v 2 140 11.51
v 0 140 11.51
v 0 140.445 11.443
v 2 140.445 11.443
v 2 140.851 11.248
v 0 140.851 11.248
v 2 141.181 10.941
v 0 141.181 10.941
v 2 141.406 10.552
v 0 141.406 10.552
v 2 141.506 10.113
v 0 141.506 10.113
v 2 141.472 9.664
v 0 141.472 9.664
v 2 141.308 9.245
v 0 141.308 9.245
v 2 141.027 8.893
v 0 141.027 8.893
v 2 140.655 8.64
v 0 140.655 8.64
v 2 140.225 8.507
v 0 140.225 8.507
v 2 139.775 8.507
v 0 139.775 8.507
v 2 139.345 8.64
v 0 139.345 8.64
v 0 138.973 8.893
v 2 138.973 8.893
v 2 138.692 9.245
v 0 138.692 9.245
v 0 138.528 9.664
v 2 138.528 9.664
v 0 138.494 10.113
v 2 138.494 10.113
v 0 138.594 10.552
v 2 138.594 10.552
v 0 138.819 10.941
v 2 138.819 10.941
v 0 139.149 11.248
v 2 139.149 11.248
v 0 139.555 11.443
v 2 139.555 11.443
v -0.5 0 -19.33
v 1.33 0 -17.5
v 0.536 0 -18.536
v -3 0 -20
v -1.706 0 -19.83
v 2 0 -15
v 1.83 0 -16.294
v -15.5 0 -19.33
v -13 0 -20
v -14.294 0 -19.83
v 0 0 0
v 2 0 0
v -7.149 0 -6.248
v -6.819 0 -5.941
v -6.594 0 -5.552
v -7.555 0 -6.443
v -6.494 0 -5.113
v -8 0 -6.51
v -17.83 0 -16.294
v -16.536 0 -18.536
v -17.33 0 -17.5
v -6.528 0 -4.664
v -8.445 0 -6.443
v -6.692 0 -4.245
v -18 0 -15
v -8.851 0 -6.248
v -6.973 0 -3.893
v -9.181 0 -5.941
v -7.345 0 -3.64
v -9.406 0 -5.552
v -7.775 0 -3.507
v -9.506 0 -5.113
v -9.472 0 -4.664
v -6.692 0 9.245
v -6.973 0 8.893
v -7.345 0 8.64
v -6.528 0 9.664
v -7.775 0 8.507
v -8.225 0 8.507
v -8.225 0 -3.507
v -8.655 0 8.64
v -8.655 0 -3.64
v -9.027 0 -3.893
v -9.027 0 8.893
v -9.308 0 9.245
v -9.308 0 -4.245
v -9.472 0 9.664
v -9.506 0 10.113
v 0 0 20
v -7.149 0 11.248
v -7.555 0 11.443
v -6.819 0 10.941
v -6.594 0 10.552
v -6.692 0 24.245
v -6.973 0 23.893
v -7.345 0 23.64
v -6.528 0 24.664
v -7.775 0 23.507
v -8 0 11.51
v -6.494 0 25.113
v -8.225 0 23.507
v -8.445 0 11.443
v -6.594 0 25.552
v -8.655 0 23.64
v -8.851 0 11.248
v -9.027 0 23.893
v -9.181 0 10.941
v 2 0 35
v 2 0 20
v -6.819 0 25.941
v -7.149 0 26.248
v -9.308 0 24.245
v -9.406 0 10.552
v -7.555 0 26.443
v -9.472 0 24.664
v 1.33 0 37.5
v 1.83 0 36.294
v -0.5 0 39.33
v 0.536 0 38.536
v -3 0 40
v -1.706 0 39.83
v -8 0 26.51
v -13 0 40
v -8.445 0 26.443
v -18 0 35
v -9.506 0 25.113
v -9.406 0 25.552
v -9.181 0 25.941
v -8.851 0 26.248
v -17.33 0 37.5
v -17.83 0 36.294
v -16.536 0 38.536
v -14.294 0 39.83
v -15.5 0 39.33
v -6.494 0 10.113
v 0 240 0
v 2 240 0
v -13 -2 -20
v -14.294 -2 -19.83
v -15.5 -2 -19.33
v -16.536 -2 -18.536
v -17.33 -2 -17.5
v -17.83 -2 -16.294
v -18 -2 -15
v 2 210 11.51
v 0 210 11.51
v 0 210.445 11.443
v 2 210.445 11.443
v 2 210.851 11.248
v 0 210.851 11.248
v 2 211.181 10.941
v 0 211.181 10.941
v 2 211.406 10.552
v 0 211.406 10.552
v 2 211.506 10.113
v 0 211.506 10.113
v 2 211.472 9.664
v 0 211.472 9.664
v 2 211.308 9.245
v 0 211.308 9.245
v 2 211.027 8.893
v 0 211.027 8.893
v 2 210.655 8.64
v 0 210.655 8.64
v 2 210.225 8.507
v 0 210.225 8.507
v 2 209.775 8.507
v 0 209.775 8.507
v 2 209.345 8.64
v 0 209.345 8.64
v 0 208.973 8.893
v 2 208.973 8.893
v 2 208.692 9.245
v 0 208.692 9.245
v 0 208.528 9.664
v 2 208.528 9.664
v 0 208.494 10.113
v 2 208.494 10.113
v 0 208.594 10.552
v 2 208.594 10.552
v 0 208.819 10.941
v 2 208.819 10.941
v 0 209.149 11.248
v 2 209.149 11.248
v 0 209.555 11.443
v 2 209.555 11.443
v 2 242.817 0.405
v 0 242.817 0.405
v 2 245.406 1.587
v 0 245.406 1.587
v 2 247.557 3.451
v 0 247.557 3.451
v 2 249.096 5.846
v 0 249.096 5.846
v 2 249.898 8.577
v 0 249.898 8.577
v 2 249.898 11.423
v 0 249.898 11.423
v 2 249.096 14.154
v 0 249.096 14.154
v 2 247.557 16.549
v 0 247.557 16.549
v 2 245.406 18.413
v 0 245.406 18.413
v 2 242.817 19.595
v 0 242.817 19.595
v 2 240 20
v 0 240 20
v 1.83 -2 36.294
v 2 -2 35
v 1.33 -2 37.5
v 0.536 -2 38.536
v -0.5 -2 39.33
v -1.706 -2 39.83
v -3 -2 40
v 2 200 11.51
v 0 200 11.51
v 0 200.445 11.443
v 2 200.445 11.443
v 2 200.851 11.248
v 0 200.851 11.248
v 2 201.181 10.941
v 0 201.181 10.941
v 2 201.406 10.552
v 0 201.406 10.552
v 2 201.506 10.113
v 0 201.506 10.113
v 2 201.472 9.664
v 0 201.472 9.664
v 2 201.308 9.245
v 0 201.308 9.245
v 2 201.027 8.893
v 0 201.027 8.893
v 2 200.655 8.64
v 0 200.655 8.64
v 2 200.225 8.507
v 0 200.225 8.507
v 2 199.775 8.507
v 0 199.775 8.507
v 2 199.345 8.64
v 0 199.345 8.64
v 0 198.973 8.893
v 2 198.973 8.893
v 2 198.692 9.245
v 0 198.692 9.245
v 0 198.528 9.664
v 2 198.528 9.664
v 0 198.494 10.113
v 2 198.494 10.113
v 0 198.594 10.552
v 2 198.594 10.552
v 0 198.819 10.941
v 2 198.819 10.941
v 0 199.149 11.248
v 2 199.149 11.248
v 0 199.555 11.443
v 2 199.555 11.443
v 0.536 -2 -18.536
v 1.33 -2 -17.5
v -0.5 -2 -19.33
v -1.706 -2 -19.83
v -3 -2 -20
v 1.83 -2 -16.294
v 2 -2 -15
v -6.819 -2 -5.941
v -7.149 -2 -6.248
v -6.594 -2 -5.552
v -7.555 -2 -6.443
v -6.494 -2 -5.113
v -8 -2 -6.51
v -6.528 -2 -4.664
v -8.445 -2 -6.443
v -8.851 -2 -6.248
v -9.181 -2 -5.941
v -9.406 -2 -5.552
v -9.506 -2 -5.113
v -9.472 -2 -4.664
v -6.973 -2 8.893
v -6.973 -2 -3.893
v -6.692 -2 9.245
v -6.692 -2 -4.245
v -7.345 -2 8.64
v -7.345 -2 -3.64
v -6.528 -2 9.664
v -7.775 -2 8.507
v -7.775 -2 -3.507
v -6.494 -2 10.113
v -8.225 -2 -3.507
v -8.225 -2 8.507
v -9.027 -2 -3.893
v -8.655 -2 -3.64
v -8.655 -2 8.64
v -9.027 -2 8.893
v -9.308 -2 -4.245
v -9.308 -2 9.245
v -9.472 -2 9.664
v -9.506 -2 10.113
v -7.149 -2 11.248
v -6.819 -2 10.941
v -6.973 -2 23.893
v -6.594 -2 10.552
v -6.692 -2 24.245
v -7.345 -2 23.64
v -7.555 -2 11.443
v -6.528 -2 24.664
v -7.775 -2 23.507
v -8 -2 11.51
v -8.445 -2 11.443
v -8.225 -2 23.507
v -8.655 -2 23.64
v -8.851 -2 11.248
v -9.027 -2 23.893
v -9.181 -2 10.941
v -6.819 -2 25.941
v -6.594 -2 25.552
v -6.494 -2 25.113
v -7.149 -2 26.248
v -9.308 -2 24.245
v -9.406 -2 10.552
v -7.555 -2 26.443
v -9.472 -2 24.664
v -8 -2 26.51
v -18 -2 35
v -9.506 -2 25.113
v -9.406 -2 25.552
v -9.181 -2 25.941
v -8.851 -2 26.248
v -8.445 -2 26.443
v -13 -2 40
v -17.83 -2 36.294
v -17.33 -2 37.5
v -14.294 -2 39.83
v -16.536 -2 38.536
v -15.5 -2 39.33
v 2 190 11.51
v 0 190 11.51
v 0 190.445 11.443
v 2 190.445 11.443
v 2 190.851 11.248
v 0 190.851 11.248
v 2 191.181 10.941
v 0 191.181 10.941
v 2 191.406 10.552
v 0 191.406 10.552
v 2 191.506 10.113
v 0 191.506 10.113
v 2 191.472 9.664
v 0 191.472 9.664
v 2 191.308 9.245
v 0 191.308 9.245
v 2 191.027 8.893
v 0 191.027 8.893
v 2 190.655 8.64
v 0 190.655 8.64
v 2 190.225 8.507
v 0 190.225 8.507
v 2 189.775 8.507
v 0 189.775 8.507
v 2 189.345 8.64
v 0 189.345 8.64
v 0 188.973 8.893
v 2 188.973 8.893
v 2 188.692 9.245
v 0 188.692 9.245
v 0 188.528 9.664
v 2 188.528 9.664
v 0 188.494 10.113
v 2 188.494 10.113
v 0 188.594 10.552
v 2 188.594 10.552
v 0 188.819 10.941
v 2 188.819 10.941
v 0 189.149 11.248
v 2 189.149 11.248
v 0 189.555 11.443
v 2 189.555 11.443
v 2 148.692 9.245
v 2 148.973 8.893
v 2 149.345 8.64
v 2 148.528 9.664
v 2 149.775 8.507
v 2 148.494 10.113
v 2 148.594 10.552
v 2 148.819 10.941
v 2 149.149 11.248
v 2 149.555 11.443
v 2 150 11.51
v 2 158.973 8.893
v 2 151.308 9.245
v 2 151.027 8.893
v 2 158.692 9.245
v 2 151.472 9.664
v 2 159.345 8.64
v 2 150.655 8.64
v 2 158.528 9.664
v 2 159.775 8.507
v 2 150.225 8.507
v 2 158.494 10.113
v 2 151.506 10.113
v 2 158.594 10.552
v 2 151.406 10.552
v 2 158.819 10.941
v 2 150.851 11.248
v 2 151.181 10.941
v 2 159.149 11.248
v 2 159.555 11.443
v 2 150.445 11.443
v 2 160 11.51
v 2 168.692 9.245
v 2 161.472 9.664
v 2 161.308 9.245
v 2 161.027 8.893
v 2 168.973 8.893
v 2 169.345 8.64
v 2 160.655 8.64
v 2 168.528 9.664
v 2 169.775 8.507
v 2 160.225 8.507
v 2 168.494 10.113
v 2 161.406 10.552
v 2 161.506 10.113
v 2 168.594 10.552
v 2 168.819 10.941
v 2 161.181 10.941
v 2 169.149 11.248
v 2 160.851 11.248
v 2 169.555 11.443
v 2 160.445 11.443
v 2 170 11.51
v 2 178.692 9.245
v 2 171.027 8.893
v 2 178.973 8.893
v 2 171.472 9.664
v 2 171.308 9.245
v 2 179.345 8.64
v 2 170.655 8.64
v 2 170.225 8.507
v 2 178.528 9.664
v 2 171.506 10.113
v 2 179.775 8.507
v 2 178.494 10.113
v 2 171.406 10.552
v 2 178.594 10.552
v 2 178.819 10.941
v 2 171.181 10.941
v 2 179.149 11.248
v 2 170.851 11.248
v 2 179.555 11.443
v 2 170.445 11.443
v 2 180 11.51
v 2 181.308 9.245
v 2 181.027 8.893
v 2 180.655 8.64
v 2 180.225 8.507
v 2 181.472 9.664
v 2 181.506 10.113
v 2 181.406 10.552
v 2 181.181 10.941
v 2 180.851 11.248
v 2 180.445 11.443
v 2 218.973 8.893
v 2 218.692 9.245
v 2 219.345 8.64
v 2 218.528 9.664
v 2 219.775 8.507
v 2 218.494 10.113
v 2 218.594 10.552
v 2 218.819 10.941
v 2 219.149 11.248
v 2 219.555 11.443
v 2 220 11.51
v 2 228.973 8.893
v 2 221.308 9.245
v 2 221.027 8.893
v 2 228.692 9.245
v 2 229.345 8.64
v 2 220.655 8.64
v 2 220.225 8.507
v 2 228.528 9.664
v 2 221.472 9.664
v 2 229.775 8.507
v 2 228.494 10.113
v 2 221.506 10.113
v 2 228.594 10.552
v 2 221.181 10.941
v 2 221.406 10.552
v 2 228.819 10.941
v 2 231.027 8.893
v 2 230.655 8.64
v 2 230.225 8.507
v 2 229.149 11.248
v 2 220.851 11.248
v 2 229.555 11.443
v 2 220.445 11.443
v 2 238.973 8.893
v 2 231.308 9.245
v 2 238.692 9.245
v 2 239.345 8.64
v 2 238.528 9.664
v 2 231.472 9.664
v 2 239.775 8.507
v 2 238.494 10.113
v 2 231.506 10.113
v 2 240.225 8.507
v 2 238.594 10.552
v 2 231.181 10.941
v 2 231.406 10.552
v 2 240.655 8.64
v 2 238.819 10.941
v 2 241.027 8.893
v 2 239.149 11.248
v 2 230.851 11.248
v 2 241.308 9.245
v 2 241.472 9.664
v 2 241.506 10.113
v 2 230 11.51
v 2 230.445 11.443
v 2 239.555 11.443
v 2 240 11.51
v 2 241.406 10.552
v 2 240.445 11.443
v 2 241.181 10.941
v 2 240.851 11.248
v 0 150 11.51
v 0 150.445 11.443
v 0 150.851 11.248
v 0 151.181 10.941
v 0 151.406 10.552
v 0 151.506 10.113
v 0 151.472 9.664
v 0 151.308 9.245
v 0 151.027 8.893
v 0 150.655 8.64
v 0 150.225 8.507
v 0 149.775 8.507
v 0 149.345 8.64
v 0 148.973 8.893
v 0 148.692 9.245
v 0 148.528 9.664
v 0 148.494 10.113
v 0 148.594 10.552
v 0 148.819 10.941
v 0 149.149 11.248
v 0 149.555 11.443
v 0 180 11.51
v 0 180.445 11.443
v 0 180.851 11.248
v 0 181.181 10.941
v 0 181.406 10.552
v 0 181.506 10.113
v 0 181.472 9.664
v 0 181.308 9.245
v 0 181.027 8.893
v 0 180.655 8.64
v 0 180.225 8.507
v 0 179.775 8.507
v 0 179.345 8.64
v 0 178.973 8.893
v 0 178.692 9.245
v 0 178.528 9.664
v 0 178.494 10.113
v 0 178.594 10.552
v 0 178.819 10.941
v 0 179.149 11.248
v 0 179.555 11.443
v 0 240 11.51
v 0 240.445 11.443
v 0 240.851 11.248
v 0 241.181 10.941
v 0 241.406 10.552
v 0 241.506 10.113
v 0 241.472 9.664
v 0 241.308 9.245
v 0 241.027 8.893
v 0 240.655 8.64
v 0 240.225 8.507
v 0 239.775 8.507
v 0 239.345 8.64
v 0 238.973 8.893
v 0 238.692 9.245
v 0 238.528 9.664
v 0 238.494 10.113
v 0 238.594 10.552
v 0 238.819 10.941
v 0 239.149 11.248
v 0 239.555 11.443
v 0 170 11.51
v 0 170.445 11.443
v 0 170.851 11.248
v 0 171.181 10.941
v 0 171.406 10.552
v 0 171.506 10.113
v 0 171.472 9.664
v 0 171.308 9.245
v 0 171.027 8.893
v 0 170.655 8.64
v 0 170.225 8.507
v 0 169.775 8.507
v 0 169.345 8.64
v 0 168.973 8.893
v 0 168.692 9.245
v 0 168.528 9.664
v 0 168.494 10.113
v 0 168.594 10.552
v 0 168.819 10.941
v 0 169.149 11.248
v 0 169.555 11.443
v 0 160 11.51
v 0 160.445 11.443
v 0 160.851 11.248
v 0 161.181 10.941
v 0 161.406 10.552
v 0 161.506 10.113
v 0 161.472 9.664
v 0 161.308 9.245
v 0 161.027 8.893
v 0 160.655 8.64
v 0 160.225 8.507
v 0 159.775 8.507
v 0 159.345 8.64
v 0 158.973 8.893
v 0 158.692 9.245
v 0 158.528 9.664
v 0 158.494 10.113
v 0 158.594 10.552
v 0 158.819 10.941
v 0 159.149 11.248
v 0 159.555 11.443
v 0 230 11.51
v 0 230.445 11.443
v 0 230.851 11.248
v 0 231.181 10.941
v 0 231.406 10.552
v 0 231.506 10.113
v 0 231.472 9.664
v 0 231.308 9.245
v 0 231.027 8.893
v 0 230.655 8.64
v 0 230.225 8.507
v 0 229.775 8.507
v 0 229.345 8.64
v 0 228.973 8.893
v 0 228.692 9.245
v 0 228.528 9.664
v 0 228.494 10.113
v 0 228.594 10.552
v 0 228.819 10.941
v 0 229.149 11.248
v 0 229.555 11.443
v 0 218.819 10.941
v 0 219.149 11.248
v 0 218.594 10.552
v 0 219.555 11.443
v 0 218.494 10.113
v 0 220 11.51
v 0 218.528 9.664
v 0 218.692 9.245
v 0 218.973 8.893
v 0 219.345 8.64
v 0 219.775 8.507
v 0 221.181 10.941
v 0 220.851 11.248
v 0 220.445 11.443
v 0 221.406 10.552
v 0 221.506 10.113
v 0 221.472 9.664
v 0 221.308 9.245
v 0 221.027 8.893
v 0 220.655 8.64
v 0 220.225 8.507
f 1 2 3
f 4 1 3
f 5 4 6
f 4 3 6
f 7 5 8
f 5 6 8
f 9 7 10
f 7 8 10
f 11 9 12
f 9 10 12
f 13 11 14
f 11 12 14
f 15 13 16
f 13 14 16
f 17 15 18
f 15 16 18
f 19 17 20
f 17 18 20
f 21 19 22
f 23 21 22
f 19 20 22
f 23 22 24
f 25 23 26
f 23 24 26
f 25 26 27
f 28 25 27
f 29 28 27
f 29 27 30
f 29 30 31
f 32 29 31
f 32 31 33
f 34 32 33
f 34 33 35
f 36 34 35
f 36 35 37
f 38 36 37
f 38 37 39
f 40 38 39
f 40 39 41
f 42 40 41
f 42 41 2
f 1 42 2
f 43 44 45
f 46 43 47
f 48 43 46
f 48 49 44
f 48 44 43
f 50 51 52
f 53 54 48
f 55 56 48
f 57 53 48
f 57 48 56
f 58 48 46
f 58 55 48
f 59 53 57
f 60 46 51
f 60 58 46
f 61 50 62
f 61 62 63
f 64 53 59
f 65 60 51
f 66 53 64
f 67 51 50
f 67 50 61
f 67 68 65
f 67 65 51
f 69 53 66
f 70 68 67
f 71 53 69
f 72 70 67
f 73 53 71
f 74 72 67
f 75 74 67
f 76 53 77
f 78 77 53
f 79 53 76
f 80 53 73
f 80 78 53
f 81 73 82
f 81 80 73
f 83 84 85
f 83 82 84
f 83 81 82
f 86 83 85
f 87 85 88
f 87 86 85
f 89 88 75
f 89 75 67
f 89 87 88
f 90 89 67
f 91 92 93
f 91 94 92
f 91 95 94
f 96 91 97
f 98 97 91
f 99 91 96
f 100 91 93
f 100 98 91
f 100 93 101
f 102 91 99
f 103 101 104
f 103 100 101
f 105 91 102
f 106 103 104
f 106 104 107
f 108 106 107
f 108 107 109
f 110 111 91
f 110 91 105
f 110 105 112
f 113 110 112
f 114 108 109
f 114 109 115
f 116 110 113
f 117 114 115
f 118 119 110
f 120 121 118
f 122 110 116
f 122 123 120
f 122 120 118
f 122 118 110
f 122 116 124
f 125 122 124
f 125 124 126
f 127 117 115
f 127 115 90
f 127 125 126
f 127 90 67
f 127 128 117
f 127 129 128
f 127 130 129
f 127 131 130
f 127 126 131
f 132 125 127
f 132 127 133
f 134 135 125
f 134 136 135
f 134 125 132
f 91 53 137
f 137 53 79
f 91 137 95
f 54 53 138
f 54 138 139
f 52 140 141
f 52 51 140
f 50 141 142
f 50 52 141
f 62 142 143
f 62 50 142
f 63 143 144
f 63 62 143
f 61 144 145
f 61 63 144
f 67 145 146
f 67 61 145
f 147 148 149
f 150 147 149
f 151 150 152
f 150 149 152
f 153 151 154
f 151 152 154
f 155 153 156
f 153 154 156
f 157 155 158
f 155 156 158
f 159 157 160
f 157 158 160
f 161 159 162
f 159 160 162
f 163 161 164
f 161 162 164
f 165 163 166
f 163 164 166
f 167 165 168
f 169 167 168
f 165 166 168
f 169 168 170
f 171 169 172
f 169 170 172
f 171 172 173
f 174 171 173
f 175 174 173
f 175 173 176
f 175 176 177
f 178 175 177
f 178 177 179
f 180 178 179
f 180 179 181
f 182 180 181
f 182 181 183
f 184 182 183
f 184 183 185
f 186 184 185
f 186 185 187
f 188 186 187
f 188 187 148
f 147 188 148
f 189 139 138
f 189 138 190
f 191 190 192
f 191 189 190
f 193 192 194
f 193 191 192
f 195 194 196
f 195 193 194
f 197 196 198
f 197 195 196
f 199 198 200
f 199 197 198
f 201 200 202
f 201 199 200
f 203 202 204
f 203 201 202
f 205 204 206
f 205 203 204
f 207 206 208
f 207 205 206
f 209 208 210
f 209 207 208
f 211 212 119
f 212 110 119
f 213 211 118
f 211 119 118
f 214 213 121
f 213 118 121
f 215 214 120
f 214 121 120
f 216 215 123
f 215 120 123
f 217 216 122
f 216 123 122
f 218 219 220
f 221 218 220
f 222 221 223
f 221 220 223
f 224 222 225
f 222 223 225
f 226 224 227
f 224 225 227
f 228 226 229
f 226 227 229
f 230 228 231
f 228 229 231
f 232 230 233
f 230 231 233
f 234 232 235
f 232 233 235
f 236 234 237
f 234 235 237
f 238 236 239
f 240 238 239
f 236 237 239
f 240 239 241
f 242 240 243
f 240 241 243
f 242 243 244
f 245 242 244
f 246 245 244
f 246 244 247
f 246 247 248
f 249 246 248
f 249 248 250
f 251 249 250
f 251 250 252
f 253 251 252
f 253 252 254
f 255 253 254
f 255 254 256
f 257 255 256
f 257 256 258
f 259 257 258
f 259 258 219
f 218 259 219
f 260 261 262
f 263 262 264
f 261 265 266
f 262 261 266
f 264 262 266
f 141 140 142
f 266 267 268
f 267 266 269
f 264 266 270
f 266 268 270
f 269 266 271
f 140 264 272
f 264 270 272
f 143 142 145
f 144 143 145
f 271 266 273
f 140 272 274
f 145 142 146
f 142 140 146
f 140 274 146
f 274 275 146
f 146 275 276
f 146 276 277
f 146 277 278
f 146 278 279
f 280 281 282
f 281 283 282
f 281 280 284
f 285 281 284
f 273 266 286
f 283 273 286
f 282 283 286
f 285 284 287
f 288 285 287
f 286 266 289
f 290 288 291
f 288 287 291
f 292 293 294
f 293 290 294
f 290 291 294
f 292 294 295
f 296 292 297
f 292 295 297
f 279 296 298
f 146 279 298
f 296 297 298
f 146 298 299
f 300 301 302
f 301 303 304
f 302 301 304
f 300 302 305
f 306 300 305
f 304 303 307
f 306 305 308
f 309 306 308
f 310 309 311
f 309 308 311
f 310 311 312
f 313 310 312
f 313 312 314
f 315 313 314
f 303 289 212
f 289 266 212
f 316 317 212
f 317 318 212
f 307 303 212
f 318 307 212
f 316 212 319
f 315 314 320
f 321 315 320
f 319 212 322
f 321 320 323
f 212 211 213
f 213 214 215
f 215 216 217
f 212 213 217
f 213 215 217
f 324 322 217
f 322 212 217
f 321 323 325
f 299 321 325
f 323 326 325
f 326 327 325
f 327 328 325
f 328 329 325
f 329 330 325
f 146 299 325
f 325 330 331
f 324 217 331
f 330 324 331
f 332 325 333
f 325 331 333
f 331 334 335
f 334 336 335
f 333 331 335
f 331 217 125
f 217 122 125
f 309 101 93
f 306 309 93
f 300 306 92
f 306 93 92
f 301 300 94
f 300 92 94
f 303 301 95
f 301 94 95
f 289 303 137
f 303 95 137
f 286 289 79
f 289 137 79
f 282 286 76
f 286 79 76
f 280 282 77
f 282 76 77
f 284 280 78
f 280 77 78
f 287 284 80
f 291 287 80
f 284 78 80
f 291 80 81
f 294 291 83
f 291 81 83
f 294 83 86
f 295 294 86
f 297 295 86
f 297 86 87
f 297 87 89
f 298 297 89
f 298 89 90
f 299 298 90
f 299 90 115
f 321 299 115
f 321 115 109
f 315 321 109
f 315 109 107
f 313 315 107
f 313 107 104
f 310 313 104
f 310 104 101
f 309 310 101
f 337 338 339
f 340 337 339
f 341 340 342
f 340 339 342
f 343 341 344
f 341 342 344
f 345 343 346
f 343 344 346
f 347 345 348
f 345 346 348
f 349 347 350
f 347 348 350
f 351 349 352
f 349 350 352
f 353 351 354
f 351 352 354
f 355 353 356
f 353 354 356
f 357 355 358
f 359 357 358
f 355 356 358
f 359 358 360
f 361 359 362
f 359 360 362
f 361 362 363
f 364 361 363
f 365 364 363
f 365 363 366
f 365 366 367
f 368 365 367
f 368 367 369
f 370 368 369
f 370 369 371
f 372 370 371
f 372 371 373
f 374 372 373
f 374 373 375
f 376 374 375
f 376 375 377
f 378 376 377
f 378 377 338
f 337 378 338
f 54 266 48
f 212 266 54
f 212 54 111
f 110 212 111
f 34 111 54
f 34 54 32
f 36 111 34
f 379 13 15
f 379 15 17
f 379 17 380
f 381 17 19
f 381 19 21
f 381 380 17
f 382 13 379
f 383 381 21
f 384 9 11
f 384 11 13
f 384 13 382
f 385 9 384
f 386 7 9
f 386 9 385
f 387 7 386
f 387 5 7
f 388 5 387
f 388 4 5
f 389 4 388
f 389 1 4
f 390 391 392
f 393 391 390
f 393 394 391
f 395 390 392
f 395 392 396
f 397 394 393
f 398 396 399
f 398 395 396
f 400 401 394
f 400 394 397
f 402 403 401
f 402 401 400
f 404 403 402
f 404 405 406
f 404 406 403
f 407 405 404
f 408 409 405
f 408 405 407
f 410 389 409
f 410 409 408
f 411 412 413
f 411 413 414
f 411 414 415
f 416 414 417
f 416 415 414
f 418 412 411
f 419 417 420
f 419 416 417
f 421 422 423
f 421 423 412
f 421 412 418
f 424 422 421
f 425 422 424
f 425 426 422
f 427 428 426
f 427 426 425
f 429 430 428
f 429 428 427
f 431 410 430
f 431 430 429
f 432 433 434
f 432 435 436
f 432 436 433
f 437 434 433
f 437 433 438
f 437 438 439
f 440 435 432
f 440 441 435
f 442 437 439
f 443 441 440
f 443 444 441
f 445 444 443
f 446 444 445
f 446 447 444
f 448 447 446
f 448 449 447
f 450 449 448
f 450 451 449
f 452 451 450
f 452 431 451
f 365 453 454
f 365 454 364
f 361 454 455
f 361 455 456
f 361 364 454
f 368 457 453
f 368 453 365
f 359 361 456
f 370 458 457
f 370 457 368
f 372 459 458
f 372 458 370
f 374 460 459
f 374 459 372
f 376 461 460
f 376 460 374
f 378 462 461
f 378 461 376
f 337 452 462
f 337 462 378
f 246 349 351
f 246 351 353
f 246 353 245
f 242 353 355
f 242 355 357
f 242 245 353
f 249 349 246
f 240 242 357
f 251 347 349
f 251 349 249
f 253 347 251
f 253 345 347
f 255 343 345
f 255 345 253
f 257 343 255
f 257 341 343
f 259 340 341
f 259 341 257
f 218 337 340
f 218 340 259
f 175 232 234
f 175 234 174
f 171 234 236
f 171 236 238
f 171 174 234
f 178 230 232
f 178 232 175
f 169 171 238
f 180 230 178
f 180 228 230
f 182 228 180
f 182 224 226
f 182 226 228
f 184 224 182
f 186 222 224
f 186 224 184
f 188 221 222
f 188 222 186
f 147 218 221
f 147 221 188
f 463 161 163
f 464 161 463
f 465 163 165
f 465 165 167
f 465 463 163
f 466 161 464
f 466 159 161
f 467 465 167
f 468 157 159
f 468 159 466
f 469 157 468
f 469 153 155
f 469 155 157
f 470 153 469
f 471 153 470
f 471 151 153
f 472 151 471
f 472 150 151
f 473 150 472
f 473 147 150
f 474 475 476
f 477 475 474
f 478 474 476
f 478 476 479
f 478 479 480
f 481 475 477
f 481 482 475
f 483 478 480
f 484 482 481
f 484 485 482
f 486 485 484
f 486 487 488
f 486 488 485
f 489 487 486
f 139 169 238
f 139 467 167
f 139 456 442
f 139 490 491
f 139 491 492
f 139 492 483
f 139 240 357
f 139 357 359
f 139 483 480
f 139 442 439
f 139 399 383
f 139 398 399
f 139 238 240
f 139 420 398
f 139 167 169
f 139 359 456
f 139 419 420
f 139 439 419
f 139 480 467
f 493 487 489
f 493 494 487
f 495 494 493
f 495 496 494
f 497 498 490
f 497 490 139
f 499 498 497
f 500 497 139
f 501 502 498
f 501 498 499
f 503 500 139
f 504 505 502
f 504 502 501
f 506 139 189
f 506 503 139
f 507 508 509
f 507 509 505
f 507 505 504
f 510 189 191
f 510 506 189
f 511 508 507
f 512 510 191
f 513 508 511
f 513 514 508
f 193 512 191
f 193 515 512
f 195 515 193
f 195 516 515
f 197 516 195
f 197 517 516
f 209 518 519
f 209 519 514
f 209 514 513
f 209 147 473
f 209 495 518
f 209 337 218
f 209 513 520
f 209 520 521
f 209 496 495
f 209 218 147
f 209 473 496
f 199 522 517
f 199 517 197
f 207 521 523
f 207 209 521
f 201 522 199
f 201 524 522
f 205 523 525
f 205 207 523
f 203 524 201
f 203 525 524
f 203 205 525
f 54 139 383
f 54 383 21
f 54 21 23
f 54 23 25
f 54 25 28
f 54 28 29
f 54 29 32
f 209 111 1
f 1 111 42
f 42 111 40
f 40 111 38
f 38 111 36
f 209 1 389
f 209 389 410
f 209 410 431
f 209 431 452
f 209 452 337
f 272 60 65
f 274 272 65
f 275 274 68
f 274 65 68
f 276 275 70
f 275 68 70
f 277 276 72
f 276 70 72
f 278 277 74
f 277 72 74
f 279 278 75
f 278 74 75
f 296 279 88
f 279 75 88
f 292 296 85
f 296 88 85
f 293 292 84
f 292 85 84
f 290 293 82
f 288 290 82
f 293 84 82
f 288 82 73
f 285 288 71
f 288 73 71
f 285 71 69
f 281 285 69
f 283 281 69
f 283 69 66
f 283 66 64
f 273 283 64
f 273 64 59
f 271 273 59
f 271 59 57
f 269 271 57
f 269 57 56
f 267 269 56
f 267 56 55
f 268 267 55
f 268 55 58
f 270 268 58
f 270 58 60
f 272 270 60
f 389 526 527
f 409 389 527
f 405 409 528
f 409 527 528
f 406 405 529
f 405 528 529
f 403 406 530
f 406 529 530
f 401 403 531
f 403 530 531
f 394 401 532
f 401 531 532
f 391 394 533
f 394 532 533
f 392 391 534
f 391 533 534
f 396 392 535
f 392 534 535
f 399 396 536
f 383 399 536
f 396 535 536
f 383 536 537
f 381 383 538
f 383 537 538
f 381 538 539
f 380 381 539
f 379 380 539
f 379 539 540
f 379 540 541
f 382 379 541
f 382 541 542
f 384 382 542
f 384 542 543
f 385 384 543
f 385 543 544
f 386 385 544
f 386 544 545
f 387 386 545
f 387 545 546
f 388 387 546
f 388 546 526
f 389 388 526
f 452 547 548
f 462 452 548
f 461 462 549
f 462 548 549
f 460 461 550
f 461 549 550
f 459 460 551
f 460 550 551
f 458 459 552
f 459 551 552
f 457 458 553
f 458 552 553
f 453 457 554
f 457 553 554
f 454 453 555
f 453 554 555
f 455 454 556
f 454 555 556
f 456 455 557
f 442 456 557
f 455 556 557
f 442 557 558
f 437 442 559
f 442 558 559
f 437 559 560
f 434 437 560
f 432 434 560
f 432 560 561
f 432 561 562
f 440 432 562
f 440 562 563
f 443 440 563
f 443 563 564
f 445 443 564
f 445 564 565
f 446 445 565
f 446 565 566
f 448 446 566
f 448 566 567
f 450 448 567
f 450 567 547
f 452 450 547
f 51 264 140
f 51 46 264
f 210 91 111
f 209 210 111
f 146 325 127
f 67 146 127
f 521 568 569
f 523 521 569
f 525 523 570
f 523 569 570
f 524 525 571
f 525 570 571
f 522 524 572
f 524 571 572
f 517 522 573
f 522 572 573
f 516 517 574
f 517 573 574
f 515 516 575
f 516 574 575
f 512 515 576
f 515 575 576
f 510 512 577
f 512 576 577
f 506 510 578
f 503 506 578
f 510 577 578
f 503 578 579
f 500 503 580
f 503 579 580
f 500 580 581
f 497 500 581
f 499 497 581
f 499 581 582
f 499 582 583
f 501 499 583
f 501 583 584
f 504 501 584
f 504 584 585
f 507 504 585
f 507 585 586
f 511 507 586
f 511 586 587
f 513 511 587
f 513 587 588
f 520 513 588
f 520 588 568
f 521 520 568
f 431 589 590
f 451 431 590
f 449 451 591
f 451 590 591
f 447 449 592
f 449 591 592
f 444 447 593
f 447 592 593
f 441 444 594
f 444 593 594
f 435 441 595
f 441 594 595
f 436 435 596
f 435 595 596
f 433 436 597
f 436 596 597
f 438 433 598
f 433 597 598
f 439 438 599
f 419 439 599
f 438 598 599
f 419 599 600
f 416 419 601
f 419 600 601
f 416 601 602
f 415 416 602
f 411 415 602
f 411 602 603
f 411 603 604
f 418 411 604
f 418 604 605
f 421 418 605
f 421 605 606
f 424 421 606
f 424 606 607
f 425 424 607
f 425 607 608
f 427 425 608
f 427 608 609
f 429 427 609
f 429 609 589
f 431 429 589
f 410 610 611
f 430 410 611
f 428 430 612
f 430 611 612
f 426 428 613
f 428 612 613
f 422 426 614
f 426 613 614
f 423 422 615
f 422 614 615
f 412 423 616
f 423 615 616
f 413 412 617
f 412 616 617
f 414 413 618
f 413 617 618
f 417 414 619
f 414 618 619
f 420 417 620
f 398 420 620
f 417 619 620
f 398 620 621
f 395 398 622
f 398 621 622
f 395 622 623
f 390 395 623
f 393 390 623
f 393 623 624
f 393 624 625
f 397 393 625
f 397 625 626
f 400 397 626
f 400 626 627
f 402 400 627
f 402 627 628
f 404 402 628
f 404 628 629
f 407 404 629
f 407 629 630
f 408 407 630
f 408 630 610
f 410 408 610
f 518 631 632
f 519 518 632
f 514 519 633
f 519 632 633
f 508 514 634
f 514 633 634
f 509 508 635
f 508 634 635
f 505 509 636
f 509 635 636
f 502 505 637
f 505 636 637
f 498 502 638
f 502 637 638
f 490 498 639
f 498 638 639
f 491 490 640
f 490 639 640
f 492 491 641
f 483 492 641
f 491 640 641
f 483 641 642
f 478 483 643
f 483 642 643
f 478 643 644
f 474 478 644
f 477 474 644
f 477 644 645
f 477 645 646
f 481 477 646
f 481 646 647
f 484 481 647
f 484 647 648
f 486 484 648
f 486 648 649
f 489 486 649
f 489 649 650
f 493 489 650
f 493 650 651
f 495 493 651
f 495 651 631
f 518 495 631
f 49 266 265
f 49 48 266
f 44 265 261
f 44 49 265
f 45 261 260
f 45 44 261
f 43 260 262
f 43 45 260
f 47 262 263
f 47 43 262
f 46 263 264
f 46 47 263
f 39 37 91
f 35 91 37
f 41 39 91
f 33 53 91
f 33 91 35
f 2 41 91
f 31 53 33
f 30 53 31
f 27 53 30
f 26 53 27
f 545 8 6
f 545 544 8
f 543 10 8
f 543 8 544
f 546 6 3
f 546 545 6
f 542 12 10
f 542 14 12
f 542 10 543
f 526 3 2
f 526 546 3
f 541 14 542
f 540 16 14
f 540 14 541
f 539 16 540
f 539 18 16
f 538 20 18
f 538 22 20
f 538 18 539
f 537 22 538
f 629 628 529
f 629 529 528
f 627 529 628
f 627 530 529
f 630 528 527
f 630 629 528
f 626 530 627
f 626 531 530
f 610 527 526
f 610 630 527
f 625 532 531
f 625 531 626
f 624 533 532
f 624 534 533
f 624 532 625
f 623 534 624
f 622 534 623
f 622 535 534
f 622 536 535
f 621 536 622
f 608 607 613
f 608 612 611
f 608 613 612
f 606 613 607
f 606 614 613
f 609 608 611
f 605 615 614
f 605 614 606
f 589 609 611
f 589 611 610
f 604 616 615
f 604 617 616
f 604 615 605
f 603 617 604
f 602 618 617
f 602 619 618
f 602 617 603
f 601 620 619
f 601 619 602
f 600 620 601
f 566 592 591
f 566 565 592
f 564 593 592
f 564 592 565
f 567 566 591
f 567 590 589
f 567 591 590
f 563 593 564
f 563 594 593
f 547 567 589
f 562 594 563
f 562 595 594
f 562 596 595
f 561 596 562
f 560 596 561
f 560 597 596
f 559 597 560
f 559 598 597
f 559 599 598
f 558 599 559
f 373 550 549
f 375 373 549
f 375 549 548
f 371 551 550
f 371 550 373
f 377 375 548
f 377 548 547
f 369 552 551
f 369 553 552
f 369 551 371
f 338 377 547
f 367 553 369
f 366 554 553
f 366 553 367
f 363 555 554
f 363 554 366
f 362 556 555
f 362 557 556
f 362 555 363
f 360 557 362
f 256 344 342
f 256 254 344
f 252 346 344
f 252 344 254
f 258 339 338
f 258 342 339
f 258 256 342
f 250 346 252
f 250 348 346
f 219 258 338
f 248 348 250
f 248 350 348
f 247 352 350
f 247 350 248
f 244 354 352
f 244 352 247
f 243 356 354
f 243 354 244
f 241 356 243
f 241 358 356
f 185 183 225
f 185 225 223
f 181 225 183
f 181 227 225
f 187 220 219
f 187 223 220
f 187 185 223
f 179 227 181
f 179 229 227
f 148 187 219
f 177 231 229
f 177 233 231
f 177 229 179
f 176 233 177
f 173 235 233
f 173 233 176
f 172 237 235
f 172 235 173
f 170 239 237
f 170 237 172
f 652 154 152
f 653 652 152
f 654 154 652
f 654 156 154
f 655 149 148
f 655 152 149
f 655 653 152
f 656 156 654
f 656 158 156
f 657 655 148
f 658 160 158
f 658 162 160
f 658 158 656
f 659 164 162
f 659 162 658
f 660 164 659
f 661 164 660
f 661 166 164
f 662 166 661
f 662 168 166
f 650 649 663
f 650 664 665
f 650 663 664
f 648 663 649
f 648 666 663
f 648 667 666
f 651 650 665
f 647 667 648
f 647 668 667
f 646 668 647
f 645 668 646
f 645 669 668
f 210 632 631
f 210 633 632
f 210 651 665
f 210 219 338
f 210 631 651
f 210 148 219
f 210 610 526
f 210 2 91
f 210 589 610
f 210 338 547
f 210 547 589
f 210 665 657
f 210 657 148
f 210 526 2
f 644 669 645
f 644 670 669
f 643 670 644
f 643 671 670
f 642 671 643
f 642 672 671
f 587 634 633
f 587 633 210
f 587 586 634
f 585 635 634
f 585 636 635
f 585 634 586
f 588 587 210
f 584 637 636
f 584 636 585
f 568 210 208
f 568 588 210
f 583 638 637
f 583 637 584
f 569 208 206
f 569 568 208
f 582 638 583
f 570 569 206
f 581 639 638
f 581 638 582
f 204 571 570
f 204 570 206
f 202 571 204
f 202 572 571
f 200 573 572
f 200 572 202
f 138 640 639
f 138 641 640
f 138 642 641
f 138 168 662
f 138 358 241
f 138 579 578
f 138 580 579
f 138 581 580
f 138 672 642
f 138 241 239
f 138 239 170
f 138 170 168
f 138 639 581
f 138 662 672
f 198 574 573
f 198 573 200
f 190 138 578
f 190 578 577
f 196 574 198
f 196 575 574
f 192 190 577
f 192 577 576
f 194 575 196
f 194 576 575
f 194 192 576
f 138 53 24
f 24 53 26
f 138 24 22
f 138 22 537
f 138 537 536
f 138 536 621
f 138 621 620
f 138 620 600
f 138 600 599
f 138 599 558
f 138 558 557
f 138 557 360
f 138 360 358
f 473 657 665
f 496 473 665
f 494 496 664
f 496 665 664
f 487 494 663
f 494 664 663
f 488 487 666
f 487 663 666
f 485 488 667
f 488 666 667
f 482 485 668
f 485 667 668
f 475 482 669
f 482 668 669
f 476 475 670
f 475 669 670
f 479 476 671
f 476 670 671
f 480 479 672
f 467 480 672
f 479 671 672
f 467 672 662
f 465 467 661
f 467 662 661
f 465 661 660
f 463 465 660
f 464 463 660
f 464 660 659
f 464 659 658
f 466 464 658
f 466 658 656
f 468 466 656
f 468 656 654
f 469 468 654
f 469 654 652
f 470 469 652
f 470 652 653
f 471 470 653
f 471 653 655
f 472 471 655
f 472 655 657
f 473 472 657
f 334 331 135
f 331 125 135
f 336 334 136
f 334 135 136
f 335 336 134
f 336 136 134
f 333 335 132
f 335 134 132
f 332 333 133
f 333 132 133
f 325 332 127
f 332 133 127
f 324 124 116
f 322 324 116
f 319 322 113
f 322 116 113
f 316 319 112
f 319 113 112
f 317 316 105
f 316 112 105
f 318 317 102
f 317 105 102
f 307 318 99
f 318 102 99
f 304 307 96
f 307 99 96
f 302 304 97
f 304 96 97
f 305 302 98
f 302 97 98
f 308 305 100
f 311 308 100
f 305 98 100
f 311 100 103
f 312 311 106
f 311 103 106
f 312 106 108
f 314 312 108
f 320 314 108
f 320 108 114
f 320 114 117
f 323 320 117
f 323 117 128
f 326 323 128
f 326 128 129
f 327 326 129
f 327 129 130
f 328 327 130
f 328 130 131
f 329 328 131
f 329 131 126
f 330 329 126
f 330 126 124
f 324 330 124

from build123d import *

# Parameters (mm, degrees)
SKETCH_1_W           = 2
SKETCH_1_H           = 250
EXTRUDE_1_DEPTH      = 20
EXTRUDE_2_DEPTH      = 20
EXTRUDE_2_DEPTH_BACK = 40
SKETCH_2_W           = 20
SKETCH_2_H           = 2
SKETCH_3_R           = 1.51
CUT_EXTRUDE_1_DEPTH  = 254.818833029
FILLET_1_R           = 5
FILLET_2_RADIUS      = 10
FILLET_2_LENGTH      = 2
SKETCH_4_R           = 1.51
CUT_EXTRUDE_2_DEPTH  = 254.818833029


with BuildPart() as part:
    # 草图1 → 凸台-拉伸1 (new body)
    with BuildSketch(Plane.XY):
        with Locations((1, 125)):
            Rectangle(SKETCH_1_W, SKETCH_1_H)
    extrude(amount=EXTRUDE_1_DEPTH)

    # 草图2 → 凸台-拉伸2 (add, two sides: drawn at the far end of the back side and taken through both)
    with BuildSketch(Plane(origin=(0, 0, 0), x_dir=(-1, 0, 0), z_dir=(0, 0, -1)).offset(-EXTRUDE_2_DEPTH_BACK)):
        with Locations((8, -1)):
            Rectangle(SKETCH_2_W, SKETCH_2_H)
    extrude(amount=EXTRUDE_2_DEPTH + EXTRUDE_2_DEPTH_BACK)

    # 草图3 → 切除-拉伸1 (cut, through all)
    with BuildSketch(Plane(origin=(0, 0, 0), x_dir=(1, 0, 0), z_dir=(0, 1, 0))):
        with Locations(Location((-8, -25, 0), (0, 0, 270))):
            Circle(SKETCH_3_R)
        with Locations(Location((-8, -10, 0), (0, 0, 270))):
            Circle(SKETCH_3_R)
        with Locations(Location((-8, 5, 0), (0, 0, 90))):
            Circle(SKETCH_3_R)
    extrude(amount=-CUT_EXTRUDE_1_DEPTH, mode=Mode.SUBTRACT)

    # 圆角1
    fillet_1_edges = [part.edges().sort_by_distance(p)[0] for p in [
        (-18, -1, 40),
        (2, -1, 40),
        (2, -1, -20),
        (-18, -1, -20),
    ]]
    fillet(fillet_1_edges, radius=FILLET_1_R)

    # 圆角2: full round fillet: the end face becomes a half cylinder, R = half its width
    fillet_2_face = Plane((1, 250, 10), x_dir=(1, 0, 0), z_dir=(0, 1, 0))  # on the end face: x along it, z out of the body
    fillet_2_slab = fillet_2_face.offset(-FILLET_2_RADIUS / 2) * Box(FILLET_2_LENGTH, 2 * FILLET_2_RADIUS, FILLET_2_RADIUS, mode=Mode.PRIVATE)  # the body's end, R deep
    fillet_2_round = Plane((1, 240, 10), x_dir=(0, 1, 0), z_dir=(1, 0, 0)) * Cylinder(FILLET_2_RADIUS, FILLET_2_LENGTH, mode=Mode.PRIVATE)  # its axis R under the face
    add(fillet_2_slab - fillet_2_round, mode=Mode.SUBTRACT)

    # 草图4 → 切除-拉伸2 (cut, through all)
    with BuildSketch(Plane.ZY):
        with Locations((10, 240)):
            Circle(SKETCH_4_R)
        with Locations((10, 230)):
            Circle(SKETCH_4_R)
        with Locations((10, 220)):
            Circle(SKETCH_4_R)
        with Locations((10, 210)):
            Circle(SKETCH_4_R)
        with Locations((10, 200)):
            Circle(SKETCH_4_R)
        with Locations((10, 190)):
            Circle(SKETCH_4_R)
        with Locations((10, 180)):
            Circle(SKETCH_4_R)
        with Locations((10, 170)):
            Circle(SKETCH_4_R)
        with Locations((10, 160)):
            Circle(SKETCH_4_R)
        with Locations((10, 150)):
            Circle(SKETCH_4_R)
        with Locations((10, 140)):
            Circle(SKETCH_4_R)
    extrude(amount=-CUT_EXTRUDE_2_DEPTH, mode=Mode.SUBTRACT)


solid = part.part
